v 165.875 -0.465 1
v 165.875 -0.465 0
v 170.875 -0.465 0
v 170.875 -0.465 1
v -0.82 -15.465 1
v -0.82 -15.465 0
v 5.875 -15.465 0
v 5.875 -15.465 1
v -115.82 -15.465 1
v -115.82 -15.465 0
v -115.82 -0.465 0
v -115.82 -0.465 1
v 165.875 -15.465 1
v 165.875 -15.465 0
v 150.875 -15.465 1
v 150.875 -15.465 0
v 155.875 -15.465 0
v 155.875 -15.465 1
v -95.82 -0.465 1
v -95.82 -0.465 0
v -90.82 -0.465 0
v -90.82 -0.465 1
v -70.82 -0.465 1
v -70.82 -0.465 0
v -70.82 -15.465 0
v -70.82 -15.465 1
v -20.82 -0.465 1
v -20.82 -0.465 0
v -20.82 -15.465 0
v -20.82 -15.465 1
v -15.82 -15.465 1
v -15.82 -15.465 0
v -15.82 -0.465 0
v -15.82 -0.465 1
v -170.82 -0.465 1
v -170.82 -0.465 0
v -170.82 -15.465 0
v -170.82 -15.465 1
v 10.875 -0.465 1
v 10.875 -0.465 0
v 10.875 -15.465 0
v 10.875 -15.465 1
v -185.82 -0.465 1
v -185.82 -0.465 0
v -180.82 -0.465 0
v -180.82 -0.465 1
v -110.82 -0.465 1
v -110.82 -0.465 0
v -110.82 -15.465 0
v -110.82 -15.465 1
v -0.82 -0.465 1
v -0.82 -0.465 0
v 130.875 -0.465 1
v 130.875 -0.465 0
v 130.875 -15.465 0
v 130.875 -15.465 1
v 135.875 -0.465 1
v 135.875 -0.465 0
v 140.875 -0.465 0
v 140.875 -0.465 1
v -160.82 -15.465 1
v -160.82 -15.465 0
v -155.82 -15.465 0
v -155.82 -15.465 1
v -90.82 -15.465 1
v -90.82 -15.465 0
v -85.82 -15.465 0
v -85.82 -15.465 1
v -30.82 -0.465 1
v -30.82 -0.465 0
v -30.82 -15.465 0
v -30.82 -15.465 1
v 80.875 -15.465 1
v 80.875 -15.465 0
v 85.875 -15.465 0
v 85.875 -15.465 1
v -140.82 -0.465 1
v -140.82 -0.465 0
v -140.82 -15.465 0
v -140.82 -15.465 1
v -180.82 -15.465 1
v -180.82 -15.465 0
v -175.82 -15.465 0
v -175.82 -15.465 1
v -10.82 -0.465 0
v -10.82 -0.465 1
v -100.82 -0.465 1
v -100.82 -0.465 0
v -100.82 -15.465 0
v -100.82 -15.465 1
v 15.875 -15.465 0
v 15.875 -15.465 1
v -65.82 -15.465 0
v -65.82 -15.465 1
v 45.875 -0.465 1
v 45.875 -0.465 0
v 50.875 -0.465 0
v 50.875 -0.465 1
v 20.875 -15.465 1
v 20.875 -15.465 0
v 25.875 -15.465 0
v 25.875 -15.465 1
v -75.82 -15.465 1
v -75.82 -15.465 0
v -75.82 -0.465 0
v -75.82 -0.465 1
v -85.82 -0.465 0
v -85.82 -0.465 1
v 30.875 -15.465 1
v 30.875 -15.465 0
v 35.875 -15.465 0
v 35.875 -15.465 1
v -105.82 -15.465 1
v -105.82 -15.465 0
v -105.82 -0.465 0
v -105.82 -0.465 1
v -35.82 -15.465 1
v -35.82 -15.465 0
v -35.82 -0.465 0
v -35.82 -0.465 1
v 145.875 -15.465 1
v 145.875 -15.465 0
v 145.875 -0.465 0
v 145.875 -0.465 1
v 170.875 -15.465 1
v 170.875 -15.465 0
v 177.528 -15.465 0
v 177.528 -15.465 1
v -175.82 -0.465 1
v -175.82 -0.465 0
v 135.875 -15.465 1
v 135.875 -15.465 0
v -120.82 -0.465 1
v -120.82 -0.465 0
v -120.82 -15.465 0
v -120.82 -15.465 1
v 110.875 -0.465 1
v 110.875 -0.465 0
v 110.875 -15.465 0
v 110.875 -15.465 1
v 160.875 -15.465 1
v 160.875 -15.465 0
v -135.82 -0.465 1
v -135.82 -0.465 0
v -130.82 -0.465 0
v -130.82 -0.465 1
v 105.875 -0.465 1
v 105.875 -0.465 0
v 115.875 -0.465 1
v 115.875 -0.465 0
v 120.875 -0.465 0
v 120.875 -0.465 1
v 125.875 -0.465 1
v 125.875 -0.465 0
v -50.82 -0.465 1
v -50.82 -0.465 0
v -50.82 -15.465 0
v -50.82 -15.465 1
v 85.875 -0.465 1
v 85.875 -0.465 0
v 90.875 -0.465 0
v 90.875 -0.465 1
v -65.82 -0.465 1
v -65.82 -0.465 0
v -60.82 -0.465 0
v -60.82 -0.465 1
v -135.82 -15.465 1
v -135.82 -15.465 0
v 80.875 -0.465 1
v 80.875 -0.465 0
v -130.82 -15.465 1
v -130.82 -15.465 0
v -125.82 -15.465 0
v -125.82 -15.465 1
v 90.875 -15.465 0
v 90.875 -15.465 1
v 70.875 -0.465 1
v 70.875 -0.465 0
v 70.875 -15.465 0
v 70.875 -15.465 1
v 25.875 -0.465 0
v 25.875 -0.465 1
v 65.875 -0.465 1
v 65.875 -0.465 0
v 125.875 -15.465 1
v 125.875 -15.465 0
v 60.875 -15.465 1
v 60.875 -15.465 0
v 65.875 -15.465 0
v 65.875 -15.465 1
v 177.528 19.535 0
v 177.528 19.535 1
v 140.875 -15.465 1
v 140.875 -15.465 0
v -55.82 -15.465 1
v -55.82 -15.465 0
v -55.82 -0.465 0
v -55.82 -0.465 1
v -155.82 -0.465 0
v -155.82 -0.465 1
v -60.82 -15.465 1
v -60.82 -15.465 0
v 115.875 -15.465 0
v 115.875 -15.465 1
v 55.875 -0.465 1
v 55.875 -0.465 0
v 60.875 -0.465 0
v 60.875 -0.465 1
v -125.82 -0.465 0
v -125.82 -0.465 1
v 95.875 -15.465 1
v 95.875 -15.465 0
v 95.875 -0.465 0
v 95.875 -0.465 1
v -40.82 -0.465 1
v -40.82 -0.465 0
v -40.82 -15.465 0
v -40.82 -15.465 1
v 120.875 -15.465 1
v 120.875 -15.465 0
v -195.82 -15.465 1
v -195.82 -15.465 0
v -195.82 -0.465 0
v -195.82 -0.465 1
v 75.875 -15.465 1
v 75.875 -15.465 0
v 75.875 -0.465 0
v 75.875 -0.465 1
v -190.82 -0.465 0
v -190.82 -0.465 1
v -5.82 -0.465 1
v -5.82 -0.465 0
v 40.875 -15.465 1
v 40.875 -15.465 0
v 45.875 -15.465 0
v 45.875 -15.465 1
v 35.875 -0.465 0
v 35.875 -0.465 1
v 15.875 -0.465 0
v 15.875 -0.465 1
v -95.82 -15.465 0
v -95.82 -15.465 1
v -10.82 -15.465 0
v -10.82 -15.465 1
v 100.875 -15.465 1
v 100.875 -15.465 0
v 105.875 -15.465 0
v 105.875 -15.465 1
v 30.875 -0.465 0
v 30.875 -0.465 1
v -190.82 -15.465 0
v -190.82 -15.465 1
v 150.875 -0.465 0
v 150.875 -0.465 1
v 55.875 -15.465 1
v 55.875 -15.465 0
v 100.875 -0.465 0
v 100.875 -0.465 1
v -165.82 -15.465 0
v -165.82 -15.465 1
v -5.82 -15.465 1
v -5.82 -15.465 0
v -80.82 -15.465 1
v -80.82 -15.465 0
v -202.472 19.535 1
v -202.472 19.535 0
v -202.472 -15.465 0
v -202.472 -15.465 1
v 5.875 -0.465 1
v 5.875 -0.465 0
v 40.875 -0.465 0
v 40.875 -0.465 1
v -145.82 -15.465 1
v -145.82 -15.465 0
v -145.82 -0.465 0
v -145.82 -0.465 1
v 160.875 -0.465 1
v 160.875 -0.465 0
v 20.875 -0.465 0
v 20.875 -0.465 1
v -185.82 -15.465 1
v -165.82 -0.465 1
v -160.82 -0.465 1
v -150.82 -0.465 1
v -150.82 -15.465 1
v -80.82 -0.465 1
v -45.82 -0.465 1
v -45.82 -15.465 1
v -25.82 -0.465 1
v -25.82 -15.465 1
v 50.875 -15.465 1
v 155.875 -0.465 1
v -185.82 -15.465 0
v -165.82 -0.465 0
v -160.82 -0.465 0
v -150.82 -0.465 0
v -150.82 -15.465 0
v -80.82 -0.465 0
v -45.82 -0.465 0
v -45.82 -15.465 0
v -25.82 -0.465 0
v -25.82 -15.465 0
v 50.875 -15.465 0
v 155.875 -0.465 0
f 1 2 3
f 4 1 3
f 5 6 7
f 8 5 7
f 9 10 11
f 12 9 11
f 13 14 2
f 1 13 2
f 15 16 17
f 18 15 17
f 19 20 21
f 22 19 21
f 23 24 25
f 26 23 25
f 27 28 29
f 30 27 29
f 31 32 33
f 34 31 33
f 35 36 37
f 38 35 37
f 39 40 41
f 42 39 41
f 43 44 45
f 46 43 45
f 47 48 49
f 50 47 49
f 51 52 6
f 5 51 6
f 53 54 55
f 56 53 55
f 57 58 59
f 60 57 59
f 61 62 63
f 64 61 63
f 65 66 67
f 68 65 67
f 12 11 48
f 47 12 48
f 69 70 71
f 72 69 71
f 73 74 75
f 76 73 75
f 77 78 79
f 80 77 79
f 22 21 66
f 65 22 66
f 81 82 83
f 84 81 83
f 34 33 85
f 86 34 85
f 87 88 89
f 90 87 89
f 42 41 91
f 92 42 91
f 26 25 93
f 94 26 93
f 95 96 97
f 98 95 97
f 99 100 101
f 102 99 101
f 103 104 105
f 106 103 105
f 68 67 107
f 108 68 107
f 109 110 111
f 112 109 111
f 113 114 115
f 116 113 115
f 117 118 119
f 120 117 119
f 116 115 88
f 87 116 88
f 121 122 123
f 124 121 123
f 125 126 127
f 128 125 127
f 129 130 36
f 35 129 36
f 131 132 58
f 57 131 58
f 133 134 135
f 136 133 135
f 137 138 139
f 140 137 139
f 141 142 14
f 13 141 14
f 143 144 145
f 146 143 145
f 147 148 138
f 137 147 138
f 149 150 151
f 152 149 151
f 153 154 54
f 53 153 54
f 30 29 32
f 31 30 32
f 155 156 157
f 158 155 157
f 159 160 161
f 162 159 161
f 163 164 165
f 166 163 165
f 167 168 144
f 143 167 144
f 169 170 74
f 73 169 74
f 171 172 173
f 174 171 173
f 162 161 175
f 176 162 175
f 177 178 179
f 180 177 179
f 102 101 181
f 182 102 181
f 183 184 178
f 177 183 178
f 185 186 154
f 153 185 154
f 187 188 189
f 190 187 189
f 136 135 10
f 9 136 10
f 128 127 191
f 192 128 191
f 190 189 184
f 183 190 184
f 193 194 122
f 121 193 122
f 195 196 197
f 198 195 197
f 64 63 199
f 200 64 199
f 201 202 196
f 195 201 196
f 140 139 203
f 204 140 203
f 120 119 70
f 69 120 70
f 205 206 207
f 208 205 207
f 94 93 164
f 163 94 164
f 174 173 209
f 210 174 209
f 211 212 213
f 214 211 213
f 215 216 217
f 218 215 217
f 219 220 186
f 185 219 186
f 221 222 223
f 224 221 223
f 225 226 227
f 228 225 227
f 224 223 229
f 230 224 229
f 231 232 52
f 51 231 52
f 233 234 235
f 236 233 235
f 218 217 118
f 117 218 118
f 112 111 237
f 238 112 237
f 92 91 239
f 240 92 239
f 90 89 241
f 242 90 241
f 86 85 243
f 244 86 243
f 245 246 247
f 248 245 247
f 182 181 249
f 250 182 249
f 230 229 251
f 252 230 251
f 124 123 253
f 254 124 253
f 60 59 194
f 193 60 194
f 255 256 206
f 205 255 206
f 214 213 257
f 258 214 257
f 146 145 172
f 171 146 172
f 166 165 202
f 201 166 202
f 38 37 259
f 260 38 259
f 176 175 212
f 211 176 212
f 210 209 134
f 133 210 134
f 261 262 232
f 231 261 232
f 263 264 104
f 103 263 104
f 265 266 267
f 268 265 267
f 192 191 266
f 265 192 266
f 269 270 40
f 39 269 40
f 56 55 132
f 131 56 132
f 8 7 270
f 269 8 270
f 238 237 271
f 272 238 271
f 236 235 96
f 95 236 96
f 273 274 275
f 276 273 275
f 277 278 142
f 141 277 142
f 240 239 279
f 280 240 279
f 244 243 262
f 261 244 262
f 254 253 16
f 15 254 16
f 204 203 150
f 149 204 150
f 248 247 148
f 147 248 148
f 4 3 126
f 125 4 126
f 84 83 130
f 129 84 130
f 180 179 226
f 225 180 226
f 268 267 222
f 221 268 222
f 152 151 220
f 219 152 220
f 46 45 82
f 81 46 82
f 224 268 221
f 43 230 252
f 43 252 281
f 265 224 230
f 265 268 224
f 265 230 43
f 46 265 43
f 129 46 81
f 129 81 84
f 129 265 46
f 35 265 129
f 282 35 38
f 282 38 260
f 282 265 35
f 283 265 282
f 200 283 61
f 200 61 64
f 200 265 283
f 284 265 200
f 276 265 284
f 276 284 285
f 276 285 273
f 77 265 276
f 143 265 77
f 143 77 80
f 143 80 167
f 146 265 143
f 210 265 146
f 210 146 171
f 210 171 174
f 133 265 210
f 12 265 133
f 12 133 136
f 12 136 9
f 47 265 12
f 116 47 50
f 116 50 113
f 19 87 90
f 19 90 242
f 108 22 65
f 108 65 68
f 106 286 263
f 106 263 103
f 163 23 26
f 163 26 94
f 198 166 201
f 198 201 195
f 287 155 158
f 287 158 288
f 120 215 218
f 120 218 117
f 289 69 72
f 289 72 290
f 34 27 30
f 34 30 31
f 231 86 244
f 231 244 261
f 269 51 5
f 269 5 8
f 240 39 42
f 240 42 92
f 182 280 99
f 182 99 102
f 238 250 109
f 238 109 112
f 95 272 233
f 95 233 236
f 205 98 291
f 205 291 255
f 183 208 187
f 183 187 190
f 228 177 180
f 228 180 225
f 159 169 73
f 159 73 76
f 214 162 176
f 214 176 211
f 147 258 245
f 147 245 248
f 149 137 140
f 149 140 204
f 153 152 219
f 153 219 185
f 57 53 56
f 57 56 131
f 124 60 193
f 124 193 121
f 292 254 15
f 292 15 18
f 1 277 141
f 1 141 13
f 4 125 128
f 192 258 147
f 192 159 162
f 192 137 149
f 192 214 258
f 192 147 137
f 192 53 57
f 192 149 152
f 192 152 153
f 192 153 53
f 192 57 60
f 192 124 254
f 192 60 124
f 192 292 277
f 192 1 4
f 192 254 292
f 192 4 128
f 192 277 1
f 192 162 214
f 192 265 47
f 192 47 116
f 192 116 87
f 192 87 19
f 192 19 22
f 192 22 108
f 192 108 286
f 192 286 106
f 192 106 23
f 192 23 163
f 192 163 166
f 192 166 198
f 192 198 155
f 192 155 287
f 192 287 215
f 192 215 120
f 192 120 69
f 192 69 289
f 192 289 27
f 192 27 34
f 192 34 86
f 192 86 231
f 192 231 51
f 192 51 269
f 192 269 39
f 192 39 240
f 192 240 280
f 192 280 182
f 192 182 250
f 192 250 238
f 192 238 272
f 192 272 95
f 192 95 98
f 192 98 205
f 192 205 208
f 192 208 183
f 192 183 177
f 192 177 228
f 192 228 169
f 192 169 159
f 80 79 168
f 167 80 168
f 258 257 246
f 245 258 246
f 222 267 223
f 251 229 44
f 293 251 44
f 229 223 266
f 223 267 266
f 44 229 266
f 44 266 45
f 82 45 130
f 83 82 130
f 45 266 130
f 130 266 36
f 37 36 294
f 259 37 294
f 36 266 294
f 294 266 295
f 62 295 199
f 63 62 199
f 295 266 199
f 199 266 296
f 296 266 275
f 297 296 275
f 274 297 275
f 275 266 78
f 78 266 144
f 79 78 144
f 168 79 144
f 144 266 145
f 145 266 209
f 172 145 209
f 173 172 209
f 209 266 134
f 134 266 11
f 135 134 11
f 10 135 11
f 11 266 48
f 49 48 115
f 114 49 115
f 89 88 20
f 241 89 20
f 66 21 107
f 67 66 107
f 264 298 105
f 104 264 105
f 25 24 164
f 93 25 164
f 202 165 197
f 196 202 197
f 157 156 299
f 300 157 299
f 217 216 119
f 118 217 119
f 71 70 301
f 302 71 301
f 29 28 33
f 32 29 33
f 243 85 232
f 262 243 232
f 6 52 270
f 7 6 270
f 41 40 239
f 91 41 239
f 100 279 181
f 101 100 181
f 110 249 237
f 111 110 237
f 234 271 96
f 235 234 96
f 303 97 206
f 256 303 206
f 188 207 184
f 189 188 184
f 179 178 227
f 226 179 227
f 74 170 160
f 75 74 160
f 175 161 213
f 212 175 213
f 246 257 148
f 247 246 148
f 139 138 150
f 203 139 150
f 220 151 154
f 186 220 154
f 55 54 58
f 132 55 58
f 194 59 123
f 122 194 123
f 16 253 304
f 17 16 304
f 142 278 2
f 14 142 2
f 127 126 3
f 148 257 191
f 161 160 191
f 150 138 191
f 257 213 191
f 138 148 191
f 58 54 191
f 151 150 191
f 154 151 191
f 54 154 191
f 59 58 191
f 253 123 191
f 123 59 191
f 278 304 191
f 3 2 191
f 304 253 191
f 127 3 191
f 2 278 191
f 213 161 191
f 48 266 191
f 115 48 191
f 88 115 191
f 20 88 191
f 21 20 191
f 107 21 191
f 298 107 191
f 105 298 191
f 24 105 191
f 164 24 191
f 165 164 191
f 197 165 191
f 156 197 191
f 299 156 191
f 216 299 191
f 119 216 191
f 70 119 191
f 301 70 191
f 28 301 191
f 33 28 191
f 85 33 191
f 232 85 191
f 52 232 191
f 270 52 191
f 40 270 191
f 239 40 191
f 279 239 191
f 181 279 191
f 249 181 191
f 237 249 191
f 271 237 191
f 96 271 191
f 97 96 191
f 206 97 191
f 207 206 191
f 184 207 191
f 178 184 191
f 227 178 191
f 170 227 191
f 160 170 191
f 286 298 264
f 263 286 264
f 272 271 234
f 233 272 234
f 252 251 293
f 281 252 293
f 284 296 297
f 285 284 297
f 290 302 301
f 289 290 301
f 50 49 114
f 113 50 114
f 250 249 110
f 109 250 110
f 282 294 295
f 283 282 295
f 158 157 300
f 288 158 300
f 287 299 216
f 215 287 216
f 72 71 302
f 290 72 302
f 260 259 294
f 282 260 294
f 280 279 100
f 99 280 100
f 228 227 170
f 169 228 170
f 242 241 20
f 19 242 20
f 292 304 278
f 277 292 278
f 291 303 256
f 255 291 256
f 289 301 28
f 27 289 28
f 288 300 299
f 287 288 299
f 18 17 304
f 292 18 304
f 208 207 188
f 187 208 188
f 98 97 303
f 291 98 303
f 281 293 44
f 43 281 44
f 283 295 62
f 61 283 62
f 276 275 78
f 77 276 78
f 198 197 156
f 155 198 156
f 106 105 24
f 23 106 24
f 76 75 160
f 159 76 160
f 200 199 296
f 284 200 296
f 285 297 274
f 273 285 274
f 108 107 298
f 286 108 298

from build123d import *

# Parameters (mm, degrees)
BOSS_EXTRUDE1_DEPTH = 1


with BuildPart() as part:
    # Sketch1 → Boss-Extrude1 (new body)
    with BuildSketch(Plane.XY):
        Polygon((-180.819610652, -0.465116279), (-180.819610652, -15.465116279), (-175.819610652, -15.465116279), (-175.819610652, -0.465116279), (-170.819610652, -0.465116279), (-170.819610652, -15.465116279), (-165.819610652, -15.465116279), (-165.819610652, -0.465116279), (-160.819610652, -0.465116279), (-160.819610652, -15.465116279), (-155.819610652, -15.465116279), (-155.819610652, -0.465116279), (-150.819610652, -0.465116279), (-150.819610652, -15.465116279), (-145.819610652, -15.465116279), (-145.819610652, -0.465116279), (-140.819610652, -0.465116279), (-140.819610652, -15.465116279), (-135.819610652, -15.465116279), (-135.819610652, -0.465116279), (-130.819610652, -0.465116279), (-130.819610652, -15.465116279), (-125.819610652, -15.465116279), (-125.819610652, -0.465116279), (-120.819610652, -0.465116279), (-120.819610652, -15.465116279), (-115.819610652, -15.465116279), (-115.819610652, -0.465116279), (-110.819610652, -0.465116279), (-110.819610652, -15.465116279), (-105.819610652, -15.465116279), (-105.819610652, -0.465116279), (-100.819610652, -0.465116279), (-100.819610652, -15.465116279), (-95.819610652, -15.465116279), (-95.819610652, -0.465116279), (-90.819610652, -0.465116279), (-90.819610652, -15.465116279), (-85.819610652, -15.465116279), (-85.819610652, -0.465116279), (-80.819610652, -0.465116279), (-80.819610652, -15.465116279), (-75.819610652, -15.465116279), (-75.819610652, -0.465116279), (-70.819610652, -0.465116279), (-70.819610652, -15.465116279), (-65.819610652, -15.465116279), (-65.819610652, -0.465116279), (-60.819610652, -0.465116279), (-60.819610652, -15.465116279), (-55.819610652, -15.465116279), (-55.819610652, -0.465116279), (-50.819610652, -0.465116279), (-50.819610652, -15.465116279), (-45.819610652, -15.465116279), (-45.819610652, -0.465116279), (-40.819610652, -0.465116279), (-40.819610652, -15.465116279), (-35.819610652, -15.465116279), (-35.819610652, -0.465116279), (-30.819610652, -0.465116279), (-30.819610652, -15.465116279), (-25.819610652, -15.465116279), (-25.819610652, -0.465116279), (-20.819610652, -0.465116279), (-20.819610652, -15.465116279), (-15.819610652, -15.465116279), (-15.819610652, -0.465116279), (-10.819610652, -0.465116279), (-10.819610652, -15.465116279), (-5.819610652, -15.465116279), (-5.819610652, -0.465116279), (-0.819610652, -0.465116279), (-0.819610652, -15.465116279), (5.874690211, -15.465116279), (5.874690211, -0.465116279), (10.874690211, -0.465116279), (10.874690211, -15.465116279), (15.874690211, -15.465116279), (15.874690211, -0.465116279), (20.874690211, -0.465116279), (20.874690211, -15.465116279), (25.874690211, -15.465116279), (25.874690211, -0.465116279), (30.874690211, -0.465116279), (30.874690211, -15.465116279), (35.874690211, -15.465116279), (35.874690211, -0.465116279), (40.874690211, -0.465116279), (40.874690211, -15.465116279), (45.874690211, -15.465116279), (45.874690211, -0.465116279), (50.874690211, -0.465116279), (50.874690211, -15.465116279), (55.874690211, -15.465116279), (55.874690211, -0.465116279), (60.874690211, -0.465116279), (60.874690211, -15.465116279), (65.874690211, -15.465116279), (65.874690211, -0.465116279), (70.874690211, -0.465116279), (70.874690211, -15.465116279), (75.874690211, -15.465116279), (75.874690211, -0.465116279), (80.874690211, -0.465116279), (80.874690211, -15.465116279), (85.874690211, -15.465116279), (85.874690211, -0.465116279), (90.874690211, -0.465116279), (90.874690211, -15.465116279), (95.874690211, -15.465116279), (95.874690211, -0.465116279), (100.874690211, -0.465116279), (100.874690211, -15.465116279), (105.874690211, -15.465116279), (105.874690211, -0.465116279), (110.874690211, -0.465116279), (110.874690211, -15.465116279), (115.874690211, -15.465116279), (115.874690211, -0.465116279), (120.874690211, -0.465116279), (120.874690211, -15.465116279), (125.874690211, -15.465116279), (125.874690211, -0.465116279), (130.874690211, -0.465116279), (130.874690211, -15.465116279), (135.874690211, -15.465116279), (135.874690211, -0.465116279), (140.874690211, -0.465116279), (140.874690211, -15.465116279), (145.874690211, -15.465116279), (145.874690211, -0.465116279), (150.874690211, -0.465116279), (150.874690211, -15.465116279), (155.874690211, -15.465116279), (155.874690211, -0.465116279), (160.874690211, -0.465116279), (160.874690211, -15.465116279), (165.874690211, -15.465116279), (165.874690211, -0.465116279), (170.874690211, -0.465116279), (170.874690211, -15.465116279), (177.52753978, -15.465116279), (177.52753978, 19.534883721), (-202.47246022, 19.534883721), (-202.47246022, -15.465116279), (-195.819610652, -15.465116279), (-195.819610652, -0.465116279), (-190.819610652, -0.465116279), (-190.819610652, -15.465116279), (-185.819610652, -15.465116279), (-185.819610652, -0.465116279), align=None)
    extrude(amount=BOSS_EXTRUDE1_DEPTH)


solid = part.part
